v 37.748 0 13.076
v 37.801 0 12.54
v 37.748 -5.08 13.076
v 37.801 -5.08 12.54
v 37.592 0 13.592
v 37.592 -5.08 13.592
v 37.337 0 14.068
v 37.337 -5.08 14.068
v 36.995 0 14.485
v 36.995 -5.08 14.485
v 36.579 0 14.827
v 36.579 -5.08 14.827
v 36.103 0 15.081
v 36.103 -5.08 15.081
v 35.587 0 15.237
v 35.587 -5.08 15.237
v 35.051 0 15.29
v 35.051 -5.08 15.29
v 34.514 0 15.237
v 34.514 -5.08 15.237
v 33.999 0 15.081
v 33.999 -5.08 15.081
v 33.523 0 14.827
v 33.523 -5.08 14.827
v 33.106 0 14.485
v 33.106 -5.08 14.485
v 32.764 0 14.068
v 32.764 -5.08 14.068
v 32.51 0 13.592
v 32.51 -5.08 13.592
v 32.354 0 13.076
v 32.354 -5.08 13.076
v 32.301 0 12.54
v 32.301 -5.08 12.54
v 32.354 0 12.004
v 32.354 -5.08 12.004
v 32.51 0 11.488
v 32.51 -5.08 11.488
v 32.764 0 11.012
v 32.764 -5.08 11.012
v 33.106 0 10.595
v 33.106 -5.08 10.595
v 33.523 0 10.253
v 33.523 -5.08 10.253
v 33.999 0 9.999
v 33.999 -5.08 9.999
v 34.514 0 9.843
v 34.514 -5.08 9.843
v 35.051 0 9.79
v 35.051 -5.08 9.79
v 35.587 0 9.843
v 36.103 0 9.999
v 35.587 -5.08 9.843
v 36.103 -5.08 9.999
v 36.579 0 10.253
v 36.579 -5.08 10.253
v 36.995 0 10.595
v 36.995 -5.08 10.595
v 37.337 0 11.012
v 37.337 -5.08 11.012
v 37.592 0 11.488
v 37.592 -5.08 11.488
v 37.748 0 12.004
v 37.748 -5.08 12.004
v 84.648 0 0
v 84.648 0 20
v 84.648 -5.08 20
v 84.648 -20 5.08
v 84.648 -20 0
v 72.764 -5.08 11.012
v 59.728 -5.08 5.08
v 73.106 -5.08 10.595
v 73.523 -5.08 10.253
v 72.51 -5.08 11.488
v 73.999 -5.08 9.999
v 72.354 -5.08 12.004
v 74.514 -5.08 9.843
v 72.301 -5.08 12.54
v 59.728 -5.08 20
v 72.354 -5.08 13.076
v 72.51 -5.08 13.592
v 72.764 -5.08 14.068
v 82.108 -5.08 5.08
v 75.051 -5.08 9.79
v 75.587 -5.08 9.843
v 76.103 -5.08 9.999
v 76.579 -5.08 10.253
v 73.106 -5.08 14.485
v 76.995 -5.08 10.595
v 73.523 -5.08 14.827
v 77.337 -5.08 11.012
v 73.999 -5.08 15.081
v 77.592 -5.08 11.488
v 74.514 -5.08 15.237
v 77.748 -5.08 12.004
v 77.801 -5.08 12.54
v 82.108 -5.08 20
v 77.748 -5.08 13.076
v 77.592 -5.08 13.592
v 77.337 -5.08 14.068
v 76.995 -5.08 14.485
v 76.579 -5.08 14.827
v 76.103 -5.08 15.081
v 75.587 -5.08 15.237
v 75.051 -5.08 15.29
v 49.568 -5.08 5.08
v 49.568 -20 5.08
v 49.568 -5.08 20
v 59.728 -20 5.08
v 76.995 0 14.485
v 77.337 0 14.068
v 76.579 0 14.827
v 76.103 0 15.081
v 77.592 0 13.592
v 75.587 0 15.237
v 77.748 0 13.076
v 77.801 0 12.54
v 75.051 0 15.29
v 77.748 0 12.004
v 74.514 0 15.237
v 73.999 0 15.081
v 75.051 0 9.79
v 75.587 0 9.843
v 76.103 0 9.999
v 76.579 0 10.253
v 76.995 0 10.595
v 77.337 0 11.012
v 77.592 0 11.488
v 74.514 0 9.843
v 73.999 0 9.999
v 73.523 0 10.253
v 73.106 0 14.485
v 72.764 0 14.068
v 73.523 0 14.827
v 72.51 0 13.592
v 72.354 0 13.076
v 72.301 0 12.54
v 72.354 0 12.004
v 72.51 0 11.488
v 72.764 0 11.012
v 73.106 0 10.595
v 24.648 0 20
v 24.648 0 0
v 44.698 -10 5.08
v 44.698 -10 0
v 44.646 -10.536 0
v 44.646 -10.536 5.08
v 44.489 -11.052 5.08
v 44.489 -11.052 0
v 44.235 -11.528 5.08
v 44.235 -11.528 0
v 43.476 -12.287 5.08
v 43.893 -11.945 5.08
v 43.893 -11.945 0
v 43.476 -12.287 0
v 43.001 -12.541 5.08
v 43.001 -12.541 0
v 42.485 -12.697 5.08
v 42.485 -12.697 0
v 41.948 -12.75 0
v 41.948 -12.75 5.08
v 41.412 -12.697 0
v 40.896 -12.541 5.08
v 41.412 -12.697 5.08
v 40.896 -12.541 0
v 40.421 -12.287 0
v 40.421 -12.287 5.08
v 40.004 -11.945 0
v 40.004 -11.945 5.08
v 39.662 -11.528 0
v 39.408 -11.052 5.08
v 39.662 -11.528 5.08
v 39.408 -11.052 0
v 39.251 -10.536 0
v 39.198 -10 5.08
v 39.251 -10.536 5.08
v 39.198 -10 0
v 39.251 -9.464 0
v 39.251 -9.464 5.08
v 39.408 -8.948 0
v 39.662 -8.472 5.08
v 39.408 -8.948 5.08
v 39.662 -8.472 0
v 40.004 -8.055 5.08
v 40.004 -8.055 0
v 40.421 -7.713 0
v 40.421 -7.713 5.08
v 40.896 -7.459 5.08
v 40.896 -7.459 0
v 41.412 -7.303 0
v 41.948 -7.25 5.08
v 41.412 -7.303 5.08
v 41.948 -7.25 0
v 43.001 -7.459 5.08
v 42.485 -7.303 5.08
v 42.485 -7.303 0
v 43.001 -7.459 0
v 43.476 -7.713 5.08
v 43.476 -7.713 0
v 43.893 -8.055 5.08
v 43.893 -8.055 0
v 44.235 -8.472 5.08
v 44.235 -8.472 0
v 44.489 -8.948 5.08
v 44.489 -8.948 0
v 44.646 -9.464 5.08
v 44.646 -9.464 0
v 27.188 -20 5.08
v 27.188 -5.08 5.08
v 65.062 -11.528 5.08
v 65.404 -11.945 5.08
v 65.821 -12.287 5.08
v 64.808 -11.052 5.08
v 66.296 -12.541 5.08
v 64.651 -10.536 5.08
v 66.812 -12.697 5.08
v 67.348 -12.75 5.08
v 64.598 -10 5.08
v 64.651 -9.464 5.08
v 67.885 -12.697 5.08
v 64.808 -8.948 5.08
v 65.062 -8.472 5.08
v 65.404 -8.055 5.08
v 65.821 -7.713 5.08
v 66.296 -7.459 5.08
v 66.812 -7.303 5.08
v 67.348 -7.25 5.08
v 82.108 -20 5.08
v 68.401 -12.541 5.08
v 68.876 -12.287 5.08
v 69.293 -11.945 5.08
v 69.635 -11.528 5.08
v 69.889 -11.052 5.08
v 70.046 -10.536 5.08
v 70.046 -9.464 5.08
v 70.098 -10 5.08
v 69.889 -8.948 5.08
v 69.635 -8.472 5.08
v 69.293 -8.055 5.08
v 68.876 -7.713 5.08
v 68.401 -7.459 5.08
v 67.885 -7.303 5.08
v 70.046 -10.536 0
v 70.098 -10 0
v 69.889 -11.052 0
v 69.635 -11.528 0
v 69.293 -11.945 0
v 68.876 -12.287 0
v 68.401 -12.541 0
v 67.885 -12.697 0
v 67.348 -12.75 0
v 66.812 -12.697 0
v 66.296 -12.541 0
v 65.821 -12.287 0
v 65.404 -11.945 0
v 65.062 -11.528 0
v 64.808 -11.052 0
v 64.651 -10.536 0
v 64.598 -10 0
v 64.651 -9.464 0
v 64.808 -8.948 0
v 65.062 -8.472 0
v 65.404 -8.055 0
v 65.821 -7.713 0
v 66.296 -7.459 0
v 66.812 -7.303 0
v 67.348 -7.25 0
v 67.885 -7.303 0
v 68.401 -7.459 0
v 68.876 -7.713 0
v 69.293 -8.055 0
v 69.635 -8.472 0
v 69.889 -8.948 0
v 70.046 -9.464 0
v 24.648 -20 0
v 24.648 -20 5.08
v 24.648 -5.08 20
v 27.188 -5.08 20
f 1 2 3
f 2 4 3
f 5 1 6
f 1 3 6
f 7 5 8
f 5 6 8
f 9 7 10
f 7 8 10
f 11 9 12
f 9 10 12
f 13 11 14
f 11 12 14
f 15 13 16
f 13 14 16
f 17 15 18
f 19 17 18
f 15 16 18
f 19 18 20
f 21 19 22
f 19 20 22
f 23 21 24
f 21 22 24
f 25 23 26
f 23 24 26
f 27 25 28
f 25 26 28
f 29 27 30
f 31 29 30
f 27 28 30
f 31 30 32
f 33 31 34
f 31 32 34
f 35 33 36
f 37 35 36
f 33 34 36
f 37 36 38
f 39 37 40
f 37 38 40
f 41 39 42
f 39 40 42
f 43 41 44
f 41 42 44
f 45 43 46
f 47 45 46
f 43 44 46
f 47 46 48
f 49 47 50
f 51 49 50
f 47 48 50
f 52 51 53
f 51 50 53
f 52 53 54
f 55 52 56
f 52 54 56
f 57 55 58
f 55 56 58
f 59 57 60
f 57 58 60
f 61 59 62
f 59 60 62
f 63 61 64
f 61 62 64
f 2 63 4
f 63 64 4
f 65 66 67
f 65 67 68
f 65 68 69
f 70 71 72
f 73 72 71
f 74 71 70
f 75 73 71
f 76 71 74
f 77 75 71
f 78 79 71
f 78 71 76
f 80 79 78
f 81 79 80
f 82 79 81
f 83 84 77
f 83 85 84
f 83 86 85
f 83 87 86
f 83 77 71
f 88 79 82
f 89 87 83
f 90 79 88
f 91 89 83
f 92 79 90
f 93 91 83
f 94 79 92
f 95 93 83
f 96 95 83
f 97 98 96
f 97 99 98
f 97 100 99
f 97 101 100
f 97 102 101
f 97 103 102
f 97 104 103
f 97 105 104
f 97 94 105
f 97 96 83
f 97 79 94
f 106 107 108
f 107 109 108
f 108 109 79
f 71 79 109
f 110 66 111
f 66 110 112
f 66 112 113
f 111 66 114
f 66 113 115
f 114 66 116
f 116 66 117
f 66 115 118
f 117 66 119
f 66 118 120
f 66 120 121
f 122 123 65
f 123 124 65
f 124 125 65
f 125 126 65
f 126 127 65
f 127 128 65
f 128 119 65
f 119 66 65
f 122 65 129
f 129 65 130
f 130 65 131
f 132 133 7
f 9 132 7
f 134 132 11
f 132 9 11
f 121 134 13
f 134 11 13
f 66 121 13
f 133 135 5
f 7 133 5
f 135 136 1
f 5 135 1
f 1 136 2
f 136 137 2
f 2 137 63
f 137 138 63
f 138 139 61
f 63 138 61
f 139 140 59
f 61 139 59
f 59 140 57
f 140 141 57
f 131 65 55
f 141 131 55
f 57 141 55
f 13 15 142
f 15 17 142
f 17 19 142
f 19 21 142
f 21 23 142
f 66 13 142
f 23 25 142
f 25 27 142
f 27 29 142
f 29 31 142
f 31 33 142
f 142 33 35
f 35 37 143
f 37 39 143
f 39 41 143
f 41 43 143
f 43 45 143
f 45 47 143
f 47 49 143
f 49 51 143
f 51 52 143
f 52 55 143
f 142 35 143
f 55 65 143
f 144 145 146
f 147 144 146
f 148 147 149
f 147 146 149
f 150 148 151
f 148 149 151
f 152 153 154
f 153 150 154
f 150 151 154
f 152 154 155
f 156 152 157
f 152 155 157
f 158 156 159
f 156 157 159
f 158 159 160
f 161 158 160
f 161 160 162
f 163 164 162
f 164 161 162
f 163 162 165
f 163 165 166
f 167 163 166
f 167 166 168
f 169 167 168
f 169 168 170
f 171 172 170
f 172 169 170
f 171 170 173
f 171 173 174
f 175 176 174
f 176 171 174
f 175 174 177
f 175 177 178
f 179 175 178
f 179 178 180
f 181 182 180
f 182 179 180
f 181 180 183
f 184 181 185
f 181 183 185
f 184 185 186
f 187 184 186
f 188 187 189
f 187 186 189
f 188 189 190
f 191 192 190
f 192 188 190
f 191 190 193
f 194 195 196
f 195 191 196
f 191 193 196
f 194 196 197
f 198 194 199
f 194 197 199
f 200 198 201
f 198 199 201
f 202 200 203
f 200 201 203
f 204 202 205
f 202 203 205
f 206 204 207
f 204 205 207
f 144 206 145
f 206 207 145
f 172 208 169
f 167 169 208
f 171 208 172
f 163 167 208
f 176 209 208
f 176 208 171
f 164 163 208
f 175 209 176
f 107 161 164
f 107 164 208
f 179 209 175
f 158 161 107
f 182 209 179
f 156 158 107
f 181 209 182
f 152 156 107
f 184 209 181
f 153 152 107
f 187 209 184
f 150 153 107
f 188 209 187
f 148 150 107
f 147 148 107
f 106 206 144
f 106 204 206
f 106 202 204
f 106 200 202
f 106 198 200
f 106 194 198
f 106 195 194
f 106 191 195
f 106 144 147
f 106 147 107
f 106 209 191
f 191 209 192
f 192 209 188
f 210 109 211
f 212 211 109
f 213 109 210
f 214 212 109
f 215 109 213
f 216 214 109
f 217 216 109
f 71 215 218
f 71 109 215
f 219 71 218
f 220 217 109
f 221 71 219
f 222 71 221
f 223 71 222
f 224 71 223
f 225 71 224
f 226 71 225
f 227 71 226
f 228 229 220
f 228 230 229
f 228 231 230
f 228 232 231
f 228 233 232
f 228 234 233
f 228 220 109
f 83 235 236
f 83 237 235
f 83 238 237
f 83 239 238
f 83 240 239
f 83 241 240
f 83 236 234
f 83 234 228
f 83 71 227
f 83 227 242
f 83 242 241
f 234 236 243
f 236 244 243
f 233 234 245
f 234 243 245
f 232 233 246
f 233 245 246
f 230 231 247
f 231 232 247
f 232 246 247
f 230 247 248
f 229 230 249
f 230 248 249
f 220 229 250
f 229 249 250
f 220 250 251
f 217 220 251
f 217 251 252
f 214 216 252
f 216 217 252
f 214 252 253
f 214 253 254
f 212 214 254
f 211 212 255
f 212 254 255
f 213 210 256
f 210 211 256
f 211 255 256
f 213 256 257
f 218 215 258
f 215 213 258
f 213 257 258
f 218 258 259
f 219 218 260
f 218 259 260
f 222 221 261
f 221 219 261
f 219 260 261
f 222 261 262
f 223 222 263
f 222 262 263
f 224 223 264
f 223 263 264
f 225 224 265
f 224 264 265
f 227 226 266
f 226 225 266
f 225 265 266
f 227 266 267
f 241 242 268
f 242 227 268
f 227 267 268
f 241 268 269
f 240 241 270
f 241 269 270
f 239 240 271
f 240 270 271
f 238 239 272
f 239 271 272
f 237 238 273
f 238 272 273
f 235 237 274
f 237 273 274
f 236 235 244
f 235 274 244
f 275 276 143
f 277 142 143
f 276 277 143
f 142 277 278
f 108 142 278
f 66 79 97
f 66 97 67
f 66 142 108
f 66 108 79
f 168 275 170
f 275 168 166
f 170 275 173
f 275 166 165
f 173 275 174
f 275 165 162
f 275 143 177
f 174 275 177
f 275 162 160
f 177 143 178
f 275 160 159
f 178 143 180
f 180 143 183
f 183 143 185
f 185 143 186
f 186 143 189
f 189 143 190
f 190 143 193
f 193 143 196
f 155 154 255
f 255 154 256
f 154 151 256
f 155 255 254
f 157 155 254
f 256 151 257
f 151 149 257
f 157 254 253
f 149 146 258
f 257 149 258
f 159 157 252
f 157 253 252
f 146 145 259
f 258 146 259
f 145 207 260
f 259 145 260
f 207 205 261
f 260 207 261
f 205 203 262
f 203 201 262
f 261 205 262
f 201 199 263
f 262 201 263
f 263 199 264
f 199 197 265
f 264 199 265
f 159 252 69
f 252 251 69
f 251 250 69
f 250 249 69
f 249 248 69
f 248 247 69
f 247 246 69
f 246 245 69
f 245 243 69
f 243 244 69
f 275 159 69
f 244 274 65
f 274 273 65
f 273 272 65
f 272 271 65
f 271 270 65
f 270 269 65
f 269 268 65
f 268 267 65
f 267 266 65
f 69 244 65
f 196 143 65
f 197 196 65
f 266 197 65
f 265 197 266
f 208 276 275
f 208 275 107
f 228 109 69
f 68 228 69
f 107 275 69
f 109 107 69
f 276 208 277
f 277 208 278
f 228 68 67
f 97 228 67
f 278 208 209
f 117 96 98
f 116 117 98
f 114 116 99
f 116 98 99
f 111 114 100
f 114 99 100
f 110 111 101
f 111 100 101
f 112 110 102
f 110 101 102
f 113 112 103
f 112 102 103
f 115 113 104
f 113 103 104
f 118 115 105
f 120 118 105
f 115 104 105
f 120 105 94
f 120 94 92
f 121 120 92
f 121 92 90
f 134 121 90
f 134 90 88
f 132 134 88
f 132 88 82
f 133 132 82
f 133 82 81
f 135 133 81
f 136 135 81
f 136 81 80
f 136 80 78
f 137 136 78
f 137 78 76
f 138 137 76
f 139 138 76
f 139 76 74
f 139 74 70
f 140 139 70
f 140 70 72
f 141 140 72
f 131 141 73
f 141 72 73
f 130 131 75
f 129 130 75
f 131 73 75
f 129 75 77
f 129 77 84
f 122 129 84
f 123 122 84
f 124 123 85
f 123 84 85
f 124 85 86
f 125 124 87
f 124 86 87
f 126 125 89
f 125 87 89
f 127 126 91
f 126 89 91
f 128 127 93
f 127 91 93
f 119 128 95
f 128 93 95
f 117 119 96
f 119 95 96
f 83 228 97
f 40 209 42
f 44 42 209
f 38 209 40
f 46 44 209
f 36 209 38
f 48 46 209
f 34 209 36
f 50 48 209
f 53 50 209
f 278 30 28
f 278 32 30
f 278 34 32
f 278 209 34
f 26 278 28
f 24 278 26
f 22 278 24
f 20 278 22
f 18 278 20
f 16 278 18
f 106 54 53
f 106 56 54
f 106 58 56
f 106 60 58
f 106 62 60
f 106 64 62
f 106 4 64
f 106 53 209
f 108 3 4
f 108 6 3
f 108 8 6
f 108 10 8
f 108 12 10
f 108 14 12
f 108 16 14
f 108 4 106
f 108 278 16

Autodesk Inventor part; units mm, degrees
ref_plane "YZ Plane" through (0, 0, 0) normal (1, 0, 0) x (0, 1, 0)
ref_plane "XZ Plane" through (0, 0, 0) normal (0, 1, 0) x (-1, 0, 0)
ref_plane "XY Plane" through (0, 0, 0) normal (0, 0, 1) x (1, 0, 0)
sketch "Sketch1" plane through (0, 0, 0) normal (0, 0, 1) x (1, 0, 0)
  line L0 (0, -1.25) -> (250, -1.25) construction
  line L1 (0, -1.25) -> (0, -6.4) projected
  line L2 (0, -6.4) -> (250, -6.4) construction
  line L3 (250, -1.25) -> (250, -6.4) projected
  line L4 (250, -18.75) -> (0, -18.75) construction
  line L5 (250, -13.6) -> (250, -18.75) projected
  line L6 (0, -13.6) -> (250, -13.6) construction
  line L7 (0, -13.6) -> (0, -18.75) projected
  line L8 (0, -20) -> (250, -20) construction
  line L9 (250, 0) -> (0, 0) construction
  line L10 (24.6484, -20) -> (84.6484, -20)
  line L11 (84.6484, -20) -> (84.6484, 0)
  line L12 (84.6484, 0) -> (24.6484, 0)
  line L13 (24.6484, 0) -> (24.6484, -20)
  line L14 (54.6484, -20) -> (54.6484, 0) construction
  circle A0 centre (67.3484, -10) radius 2.75
  circle A1 centre (41.9484, -10) radius 2.75
  line L15 (54.6484, -10) -> (41.9484, -10) construction
  line L16 (54.6484, -10) -> (67.3484, -10) construction
  point P0 (0, 0)
  dimension "d0" = 60
  dimension "d1" = 5.5
  dimension "d2" = 5.5
  dimension "d11" = 12.7
extrude "Extrusion1" add sketch "Sketch1" along normal blind 5.08
sketch "Sketch2" plane through (0, 0, 5.08) normal (0, 0, 1) x (1, 0, 0)
  line L0 (84.6484, 0) -> (24.6484, 0) projected
  line L1 (84.6484, -20) -> (84.6484, 0) projected
  line L2 (24.6484, 0) -> (84.6484, 0)
  line L3 (84.6484, 0) -> (84.6484, -5.08)
  line L4 (84.6484, -5.08) -> (24.6484, -5.08)
  line L5 (24.6484, -5.08) -> (24.6484, 0)
  point P0 (0, 0)
  dimension "d5" = 5.08
extrude "Extrusion2" add sketch "Sketch2" along normal blind 14.92
sketch "Sketch3" plane through (24.6484, -5.08, 5.08) normal (0, -1, 0) x (1, 0, 0)
  line L0 (0, -5.08) -> (0, 14.92) projected
  line L1 (0, 0) -> (60, 0) projected
  line L2 (0, 14.92) -> (0, 0)
  line L3 (60, -5.08) -> (60, 14.92) projected
  line L4 (19.1525, 952.0343) -> (19.1525, -47.9657) construction
  line L5 (19.1525, 952.0343) -> (14.0025, 952.0343) projected
  line L6 (14.0025, 952.0343) -> (14.0025, -47.9657) construction
  line L7 (19.1525, -47.9657) -> (14.0025, -47.9657) projected
  line L8 (1.6525, -47.9657) -> (1.6525, 952.0343) construction
  line L9 (6.8025, -47.9657) -> (1.6525, -47.9657) projected
  line L10 (6.8025, 952.0343) -> (6.8025, -47.9657) construction
  line L11 (6.8025, 952.0343) -> (1.6525, 952.0343) projected
  line L12 (0, 7.46) -> (1.6525, 7.46)
  line L13 (6.8025, 7.46) -> (14.0025, 7.46) construction
  line L14 (41.6525, -47.9657) -> (41.6525, 952.0343) construction
  line L15 (41.6525, -47.9657) -> (46.8025, -47.9657) projected
  line L16 (46.8025, -47.9657) -> (46.8025, 952.0343) construction
  line L17 (41.6525, 952.0343) -> (46.8025, 952.0343) projected
  line L18 (59.1525, 952.0343) -> (59.1525, -47.9657) construction
  line L19 (54.0025, 952.0343) -> (59.1525, 952.0343) projected
  line L20 (54.0025, -47.9657) -> (54.0025, 952.0343) construction
  line L21 (54.0025, -47.9657) -> (59.1525, -47.9657) projected
  line L22 (46.8025, 7.46) -> (54.0025, 7.46) construction
  line L23 (59.1525, 7.46) -> (60, 7.46)
  circle A0 centre (50.4025, 7.46) radius 2.75
  circle A1 centre (10.4025, 7.46) radius 2.75
  point P0 (-24.6484, -5.08)
  dimension "d8" = 5.5
extrude "Extrusion3" cut sketch "Sketch3" against normal blind 14.92
sketch "Sketch4" plane through (84.6484, -20, 0) normal (1, 0, 0) x (0, 0, -1)
  line L0 (-5.08, 0) -> (-5.08, 14.92) projected
  line L1 (-5.08, 14.92) -> (-20, 14.92) projected
  line L2 (-5.08, 0) -> (-20, 14.92)
  line L3 (-20, 14.92) -> (-5.08, 14.92)
  line L4 (-5.08, 14.92) -> (-5.08, 0)
  point P0 (0, 20)
extrude "Extrusion4" add sketch "Sketch4" against normal up to surface (60 mm away)
sketch "Sketch5" plane through (0, 0, 20) normal (0, 0, 1) x (1, 0, 0)
  line L0 (32.3009, 0) -> (37.8009, 0) projected
  line L1 (72.3009, 0) -> (77.8009, 0) projected
  circle A0 centre (41.9484, -10) radius 2.75 projected
  circle A1 centre (67.3484, -10) radius 2.75 projected
  line L2 (84.6484, 0) -> (24.6484, 0) projected
  line L3 (54.6484, 0) -> (54.6484, -20)
  line L4 (24.6484, -20) -> (84.6484, -20) projected
  line L5 (59.7284, -20) -> (49.5684, -20)
  line L6 (49.5684, -20) -> (49.5684, 0)
  line L7 (49.5684, 0) -> (59.7284, 0)
  line L8 (59.7284, 0) -> (59.7284, -20)
  line L9 (59.7284, -20) -> (49.5684, 0) construction
  line L10 (49.5684, -20) -> (59.7284, 0) construction
  line L11 (84.6484, -20) -> (82.1084, -20)
  line L12 (82.1084, -20) -> (82.1084, 0)
  line L13 (82.1084, 0) -> (84.6484, 0)
  line L14 (84.6484, 0) -> (84.6484, -20)
  line L15 (24.6484, -20) -> (27.1884, -20)
  line L16 (27.1884, -20) -> (27.1884, 0)
  line L17 (27.1884, 0) -> (24.6484, 0)
  line L18 (24.6484, 0) -> (24.6484, -20)
  line L19 (24.6484, -5.08) -> (84.6484, -5.08) projected
  line L20 (84.6484, 0) -> (24.6484, 0)
  line L21 (24.6484, 0) -> (24.6484, -5.08)
  line L22 (24.6484, -5.08) -> (84.6484, -5.08)
  line L23 (84.6484, -5.08) -> (84.6484, 0)
  line L24 (59.7284, -20) -> (82.1084, -20)
  line L25 (82.1084, -20) -> (82.1084, -5.08)
  line L26 (82.1084, -5.08) -> (59.7284, -5.08)
  line L27 (59.7284, -5.08) -> (59.7284, -20)
  line L28 (27.1884, -20) -> (49.5684, -20)
  line L29 (49.5684, -20) -> (49.5684, -5.08)
  line L30 (49.5684, -5.08) -> (27.1884, -5.08)
  line L31 (27.1884, -5.08) -> (27.1884, -20)
  point P0 (0, 0)
  point P1 (54.6484, -10)
  dimension "d14" = 2.54
  dimension "d15" = 2.54
  dimension "d16" = 10.16
extrude "Extrusion5" cut sketch "Sketch5" against normal blind 14.92 contours L19 L6 L4 L16 | L19 L12 L4 L8 | A0 | A1
properties part number "double90"
